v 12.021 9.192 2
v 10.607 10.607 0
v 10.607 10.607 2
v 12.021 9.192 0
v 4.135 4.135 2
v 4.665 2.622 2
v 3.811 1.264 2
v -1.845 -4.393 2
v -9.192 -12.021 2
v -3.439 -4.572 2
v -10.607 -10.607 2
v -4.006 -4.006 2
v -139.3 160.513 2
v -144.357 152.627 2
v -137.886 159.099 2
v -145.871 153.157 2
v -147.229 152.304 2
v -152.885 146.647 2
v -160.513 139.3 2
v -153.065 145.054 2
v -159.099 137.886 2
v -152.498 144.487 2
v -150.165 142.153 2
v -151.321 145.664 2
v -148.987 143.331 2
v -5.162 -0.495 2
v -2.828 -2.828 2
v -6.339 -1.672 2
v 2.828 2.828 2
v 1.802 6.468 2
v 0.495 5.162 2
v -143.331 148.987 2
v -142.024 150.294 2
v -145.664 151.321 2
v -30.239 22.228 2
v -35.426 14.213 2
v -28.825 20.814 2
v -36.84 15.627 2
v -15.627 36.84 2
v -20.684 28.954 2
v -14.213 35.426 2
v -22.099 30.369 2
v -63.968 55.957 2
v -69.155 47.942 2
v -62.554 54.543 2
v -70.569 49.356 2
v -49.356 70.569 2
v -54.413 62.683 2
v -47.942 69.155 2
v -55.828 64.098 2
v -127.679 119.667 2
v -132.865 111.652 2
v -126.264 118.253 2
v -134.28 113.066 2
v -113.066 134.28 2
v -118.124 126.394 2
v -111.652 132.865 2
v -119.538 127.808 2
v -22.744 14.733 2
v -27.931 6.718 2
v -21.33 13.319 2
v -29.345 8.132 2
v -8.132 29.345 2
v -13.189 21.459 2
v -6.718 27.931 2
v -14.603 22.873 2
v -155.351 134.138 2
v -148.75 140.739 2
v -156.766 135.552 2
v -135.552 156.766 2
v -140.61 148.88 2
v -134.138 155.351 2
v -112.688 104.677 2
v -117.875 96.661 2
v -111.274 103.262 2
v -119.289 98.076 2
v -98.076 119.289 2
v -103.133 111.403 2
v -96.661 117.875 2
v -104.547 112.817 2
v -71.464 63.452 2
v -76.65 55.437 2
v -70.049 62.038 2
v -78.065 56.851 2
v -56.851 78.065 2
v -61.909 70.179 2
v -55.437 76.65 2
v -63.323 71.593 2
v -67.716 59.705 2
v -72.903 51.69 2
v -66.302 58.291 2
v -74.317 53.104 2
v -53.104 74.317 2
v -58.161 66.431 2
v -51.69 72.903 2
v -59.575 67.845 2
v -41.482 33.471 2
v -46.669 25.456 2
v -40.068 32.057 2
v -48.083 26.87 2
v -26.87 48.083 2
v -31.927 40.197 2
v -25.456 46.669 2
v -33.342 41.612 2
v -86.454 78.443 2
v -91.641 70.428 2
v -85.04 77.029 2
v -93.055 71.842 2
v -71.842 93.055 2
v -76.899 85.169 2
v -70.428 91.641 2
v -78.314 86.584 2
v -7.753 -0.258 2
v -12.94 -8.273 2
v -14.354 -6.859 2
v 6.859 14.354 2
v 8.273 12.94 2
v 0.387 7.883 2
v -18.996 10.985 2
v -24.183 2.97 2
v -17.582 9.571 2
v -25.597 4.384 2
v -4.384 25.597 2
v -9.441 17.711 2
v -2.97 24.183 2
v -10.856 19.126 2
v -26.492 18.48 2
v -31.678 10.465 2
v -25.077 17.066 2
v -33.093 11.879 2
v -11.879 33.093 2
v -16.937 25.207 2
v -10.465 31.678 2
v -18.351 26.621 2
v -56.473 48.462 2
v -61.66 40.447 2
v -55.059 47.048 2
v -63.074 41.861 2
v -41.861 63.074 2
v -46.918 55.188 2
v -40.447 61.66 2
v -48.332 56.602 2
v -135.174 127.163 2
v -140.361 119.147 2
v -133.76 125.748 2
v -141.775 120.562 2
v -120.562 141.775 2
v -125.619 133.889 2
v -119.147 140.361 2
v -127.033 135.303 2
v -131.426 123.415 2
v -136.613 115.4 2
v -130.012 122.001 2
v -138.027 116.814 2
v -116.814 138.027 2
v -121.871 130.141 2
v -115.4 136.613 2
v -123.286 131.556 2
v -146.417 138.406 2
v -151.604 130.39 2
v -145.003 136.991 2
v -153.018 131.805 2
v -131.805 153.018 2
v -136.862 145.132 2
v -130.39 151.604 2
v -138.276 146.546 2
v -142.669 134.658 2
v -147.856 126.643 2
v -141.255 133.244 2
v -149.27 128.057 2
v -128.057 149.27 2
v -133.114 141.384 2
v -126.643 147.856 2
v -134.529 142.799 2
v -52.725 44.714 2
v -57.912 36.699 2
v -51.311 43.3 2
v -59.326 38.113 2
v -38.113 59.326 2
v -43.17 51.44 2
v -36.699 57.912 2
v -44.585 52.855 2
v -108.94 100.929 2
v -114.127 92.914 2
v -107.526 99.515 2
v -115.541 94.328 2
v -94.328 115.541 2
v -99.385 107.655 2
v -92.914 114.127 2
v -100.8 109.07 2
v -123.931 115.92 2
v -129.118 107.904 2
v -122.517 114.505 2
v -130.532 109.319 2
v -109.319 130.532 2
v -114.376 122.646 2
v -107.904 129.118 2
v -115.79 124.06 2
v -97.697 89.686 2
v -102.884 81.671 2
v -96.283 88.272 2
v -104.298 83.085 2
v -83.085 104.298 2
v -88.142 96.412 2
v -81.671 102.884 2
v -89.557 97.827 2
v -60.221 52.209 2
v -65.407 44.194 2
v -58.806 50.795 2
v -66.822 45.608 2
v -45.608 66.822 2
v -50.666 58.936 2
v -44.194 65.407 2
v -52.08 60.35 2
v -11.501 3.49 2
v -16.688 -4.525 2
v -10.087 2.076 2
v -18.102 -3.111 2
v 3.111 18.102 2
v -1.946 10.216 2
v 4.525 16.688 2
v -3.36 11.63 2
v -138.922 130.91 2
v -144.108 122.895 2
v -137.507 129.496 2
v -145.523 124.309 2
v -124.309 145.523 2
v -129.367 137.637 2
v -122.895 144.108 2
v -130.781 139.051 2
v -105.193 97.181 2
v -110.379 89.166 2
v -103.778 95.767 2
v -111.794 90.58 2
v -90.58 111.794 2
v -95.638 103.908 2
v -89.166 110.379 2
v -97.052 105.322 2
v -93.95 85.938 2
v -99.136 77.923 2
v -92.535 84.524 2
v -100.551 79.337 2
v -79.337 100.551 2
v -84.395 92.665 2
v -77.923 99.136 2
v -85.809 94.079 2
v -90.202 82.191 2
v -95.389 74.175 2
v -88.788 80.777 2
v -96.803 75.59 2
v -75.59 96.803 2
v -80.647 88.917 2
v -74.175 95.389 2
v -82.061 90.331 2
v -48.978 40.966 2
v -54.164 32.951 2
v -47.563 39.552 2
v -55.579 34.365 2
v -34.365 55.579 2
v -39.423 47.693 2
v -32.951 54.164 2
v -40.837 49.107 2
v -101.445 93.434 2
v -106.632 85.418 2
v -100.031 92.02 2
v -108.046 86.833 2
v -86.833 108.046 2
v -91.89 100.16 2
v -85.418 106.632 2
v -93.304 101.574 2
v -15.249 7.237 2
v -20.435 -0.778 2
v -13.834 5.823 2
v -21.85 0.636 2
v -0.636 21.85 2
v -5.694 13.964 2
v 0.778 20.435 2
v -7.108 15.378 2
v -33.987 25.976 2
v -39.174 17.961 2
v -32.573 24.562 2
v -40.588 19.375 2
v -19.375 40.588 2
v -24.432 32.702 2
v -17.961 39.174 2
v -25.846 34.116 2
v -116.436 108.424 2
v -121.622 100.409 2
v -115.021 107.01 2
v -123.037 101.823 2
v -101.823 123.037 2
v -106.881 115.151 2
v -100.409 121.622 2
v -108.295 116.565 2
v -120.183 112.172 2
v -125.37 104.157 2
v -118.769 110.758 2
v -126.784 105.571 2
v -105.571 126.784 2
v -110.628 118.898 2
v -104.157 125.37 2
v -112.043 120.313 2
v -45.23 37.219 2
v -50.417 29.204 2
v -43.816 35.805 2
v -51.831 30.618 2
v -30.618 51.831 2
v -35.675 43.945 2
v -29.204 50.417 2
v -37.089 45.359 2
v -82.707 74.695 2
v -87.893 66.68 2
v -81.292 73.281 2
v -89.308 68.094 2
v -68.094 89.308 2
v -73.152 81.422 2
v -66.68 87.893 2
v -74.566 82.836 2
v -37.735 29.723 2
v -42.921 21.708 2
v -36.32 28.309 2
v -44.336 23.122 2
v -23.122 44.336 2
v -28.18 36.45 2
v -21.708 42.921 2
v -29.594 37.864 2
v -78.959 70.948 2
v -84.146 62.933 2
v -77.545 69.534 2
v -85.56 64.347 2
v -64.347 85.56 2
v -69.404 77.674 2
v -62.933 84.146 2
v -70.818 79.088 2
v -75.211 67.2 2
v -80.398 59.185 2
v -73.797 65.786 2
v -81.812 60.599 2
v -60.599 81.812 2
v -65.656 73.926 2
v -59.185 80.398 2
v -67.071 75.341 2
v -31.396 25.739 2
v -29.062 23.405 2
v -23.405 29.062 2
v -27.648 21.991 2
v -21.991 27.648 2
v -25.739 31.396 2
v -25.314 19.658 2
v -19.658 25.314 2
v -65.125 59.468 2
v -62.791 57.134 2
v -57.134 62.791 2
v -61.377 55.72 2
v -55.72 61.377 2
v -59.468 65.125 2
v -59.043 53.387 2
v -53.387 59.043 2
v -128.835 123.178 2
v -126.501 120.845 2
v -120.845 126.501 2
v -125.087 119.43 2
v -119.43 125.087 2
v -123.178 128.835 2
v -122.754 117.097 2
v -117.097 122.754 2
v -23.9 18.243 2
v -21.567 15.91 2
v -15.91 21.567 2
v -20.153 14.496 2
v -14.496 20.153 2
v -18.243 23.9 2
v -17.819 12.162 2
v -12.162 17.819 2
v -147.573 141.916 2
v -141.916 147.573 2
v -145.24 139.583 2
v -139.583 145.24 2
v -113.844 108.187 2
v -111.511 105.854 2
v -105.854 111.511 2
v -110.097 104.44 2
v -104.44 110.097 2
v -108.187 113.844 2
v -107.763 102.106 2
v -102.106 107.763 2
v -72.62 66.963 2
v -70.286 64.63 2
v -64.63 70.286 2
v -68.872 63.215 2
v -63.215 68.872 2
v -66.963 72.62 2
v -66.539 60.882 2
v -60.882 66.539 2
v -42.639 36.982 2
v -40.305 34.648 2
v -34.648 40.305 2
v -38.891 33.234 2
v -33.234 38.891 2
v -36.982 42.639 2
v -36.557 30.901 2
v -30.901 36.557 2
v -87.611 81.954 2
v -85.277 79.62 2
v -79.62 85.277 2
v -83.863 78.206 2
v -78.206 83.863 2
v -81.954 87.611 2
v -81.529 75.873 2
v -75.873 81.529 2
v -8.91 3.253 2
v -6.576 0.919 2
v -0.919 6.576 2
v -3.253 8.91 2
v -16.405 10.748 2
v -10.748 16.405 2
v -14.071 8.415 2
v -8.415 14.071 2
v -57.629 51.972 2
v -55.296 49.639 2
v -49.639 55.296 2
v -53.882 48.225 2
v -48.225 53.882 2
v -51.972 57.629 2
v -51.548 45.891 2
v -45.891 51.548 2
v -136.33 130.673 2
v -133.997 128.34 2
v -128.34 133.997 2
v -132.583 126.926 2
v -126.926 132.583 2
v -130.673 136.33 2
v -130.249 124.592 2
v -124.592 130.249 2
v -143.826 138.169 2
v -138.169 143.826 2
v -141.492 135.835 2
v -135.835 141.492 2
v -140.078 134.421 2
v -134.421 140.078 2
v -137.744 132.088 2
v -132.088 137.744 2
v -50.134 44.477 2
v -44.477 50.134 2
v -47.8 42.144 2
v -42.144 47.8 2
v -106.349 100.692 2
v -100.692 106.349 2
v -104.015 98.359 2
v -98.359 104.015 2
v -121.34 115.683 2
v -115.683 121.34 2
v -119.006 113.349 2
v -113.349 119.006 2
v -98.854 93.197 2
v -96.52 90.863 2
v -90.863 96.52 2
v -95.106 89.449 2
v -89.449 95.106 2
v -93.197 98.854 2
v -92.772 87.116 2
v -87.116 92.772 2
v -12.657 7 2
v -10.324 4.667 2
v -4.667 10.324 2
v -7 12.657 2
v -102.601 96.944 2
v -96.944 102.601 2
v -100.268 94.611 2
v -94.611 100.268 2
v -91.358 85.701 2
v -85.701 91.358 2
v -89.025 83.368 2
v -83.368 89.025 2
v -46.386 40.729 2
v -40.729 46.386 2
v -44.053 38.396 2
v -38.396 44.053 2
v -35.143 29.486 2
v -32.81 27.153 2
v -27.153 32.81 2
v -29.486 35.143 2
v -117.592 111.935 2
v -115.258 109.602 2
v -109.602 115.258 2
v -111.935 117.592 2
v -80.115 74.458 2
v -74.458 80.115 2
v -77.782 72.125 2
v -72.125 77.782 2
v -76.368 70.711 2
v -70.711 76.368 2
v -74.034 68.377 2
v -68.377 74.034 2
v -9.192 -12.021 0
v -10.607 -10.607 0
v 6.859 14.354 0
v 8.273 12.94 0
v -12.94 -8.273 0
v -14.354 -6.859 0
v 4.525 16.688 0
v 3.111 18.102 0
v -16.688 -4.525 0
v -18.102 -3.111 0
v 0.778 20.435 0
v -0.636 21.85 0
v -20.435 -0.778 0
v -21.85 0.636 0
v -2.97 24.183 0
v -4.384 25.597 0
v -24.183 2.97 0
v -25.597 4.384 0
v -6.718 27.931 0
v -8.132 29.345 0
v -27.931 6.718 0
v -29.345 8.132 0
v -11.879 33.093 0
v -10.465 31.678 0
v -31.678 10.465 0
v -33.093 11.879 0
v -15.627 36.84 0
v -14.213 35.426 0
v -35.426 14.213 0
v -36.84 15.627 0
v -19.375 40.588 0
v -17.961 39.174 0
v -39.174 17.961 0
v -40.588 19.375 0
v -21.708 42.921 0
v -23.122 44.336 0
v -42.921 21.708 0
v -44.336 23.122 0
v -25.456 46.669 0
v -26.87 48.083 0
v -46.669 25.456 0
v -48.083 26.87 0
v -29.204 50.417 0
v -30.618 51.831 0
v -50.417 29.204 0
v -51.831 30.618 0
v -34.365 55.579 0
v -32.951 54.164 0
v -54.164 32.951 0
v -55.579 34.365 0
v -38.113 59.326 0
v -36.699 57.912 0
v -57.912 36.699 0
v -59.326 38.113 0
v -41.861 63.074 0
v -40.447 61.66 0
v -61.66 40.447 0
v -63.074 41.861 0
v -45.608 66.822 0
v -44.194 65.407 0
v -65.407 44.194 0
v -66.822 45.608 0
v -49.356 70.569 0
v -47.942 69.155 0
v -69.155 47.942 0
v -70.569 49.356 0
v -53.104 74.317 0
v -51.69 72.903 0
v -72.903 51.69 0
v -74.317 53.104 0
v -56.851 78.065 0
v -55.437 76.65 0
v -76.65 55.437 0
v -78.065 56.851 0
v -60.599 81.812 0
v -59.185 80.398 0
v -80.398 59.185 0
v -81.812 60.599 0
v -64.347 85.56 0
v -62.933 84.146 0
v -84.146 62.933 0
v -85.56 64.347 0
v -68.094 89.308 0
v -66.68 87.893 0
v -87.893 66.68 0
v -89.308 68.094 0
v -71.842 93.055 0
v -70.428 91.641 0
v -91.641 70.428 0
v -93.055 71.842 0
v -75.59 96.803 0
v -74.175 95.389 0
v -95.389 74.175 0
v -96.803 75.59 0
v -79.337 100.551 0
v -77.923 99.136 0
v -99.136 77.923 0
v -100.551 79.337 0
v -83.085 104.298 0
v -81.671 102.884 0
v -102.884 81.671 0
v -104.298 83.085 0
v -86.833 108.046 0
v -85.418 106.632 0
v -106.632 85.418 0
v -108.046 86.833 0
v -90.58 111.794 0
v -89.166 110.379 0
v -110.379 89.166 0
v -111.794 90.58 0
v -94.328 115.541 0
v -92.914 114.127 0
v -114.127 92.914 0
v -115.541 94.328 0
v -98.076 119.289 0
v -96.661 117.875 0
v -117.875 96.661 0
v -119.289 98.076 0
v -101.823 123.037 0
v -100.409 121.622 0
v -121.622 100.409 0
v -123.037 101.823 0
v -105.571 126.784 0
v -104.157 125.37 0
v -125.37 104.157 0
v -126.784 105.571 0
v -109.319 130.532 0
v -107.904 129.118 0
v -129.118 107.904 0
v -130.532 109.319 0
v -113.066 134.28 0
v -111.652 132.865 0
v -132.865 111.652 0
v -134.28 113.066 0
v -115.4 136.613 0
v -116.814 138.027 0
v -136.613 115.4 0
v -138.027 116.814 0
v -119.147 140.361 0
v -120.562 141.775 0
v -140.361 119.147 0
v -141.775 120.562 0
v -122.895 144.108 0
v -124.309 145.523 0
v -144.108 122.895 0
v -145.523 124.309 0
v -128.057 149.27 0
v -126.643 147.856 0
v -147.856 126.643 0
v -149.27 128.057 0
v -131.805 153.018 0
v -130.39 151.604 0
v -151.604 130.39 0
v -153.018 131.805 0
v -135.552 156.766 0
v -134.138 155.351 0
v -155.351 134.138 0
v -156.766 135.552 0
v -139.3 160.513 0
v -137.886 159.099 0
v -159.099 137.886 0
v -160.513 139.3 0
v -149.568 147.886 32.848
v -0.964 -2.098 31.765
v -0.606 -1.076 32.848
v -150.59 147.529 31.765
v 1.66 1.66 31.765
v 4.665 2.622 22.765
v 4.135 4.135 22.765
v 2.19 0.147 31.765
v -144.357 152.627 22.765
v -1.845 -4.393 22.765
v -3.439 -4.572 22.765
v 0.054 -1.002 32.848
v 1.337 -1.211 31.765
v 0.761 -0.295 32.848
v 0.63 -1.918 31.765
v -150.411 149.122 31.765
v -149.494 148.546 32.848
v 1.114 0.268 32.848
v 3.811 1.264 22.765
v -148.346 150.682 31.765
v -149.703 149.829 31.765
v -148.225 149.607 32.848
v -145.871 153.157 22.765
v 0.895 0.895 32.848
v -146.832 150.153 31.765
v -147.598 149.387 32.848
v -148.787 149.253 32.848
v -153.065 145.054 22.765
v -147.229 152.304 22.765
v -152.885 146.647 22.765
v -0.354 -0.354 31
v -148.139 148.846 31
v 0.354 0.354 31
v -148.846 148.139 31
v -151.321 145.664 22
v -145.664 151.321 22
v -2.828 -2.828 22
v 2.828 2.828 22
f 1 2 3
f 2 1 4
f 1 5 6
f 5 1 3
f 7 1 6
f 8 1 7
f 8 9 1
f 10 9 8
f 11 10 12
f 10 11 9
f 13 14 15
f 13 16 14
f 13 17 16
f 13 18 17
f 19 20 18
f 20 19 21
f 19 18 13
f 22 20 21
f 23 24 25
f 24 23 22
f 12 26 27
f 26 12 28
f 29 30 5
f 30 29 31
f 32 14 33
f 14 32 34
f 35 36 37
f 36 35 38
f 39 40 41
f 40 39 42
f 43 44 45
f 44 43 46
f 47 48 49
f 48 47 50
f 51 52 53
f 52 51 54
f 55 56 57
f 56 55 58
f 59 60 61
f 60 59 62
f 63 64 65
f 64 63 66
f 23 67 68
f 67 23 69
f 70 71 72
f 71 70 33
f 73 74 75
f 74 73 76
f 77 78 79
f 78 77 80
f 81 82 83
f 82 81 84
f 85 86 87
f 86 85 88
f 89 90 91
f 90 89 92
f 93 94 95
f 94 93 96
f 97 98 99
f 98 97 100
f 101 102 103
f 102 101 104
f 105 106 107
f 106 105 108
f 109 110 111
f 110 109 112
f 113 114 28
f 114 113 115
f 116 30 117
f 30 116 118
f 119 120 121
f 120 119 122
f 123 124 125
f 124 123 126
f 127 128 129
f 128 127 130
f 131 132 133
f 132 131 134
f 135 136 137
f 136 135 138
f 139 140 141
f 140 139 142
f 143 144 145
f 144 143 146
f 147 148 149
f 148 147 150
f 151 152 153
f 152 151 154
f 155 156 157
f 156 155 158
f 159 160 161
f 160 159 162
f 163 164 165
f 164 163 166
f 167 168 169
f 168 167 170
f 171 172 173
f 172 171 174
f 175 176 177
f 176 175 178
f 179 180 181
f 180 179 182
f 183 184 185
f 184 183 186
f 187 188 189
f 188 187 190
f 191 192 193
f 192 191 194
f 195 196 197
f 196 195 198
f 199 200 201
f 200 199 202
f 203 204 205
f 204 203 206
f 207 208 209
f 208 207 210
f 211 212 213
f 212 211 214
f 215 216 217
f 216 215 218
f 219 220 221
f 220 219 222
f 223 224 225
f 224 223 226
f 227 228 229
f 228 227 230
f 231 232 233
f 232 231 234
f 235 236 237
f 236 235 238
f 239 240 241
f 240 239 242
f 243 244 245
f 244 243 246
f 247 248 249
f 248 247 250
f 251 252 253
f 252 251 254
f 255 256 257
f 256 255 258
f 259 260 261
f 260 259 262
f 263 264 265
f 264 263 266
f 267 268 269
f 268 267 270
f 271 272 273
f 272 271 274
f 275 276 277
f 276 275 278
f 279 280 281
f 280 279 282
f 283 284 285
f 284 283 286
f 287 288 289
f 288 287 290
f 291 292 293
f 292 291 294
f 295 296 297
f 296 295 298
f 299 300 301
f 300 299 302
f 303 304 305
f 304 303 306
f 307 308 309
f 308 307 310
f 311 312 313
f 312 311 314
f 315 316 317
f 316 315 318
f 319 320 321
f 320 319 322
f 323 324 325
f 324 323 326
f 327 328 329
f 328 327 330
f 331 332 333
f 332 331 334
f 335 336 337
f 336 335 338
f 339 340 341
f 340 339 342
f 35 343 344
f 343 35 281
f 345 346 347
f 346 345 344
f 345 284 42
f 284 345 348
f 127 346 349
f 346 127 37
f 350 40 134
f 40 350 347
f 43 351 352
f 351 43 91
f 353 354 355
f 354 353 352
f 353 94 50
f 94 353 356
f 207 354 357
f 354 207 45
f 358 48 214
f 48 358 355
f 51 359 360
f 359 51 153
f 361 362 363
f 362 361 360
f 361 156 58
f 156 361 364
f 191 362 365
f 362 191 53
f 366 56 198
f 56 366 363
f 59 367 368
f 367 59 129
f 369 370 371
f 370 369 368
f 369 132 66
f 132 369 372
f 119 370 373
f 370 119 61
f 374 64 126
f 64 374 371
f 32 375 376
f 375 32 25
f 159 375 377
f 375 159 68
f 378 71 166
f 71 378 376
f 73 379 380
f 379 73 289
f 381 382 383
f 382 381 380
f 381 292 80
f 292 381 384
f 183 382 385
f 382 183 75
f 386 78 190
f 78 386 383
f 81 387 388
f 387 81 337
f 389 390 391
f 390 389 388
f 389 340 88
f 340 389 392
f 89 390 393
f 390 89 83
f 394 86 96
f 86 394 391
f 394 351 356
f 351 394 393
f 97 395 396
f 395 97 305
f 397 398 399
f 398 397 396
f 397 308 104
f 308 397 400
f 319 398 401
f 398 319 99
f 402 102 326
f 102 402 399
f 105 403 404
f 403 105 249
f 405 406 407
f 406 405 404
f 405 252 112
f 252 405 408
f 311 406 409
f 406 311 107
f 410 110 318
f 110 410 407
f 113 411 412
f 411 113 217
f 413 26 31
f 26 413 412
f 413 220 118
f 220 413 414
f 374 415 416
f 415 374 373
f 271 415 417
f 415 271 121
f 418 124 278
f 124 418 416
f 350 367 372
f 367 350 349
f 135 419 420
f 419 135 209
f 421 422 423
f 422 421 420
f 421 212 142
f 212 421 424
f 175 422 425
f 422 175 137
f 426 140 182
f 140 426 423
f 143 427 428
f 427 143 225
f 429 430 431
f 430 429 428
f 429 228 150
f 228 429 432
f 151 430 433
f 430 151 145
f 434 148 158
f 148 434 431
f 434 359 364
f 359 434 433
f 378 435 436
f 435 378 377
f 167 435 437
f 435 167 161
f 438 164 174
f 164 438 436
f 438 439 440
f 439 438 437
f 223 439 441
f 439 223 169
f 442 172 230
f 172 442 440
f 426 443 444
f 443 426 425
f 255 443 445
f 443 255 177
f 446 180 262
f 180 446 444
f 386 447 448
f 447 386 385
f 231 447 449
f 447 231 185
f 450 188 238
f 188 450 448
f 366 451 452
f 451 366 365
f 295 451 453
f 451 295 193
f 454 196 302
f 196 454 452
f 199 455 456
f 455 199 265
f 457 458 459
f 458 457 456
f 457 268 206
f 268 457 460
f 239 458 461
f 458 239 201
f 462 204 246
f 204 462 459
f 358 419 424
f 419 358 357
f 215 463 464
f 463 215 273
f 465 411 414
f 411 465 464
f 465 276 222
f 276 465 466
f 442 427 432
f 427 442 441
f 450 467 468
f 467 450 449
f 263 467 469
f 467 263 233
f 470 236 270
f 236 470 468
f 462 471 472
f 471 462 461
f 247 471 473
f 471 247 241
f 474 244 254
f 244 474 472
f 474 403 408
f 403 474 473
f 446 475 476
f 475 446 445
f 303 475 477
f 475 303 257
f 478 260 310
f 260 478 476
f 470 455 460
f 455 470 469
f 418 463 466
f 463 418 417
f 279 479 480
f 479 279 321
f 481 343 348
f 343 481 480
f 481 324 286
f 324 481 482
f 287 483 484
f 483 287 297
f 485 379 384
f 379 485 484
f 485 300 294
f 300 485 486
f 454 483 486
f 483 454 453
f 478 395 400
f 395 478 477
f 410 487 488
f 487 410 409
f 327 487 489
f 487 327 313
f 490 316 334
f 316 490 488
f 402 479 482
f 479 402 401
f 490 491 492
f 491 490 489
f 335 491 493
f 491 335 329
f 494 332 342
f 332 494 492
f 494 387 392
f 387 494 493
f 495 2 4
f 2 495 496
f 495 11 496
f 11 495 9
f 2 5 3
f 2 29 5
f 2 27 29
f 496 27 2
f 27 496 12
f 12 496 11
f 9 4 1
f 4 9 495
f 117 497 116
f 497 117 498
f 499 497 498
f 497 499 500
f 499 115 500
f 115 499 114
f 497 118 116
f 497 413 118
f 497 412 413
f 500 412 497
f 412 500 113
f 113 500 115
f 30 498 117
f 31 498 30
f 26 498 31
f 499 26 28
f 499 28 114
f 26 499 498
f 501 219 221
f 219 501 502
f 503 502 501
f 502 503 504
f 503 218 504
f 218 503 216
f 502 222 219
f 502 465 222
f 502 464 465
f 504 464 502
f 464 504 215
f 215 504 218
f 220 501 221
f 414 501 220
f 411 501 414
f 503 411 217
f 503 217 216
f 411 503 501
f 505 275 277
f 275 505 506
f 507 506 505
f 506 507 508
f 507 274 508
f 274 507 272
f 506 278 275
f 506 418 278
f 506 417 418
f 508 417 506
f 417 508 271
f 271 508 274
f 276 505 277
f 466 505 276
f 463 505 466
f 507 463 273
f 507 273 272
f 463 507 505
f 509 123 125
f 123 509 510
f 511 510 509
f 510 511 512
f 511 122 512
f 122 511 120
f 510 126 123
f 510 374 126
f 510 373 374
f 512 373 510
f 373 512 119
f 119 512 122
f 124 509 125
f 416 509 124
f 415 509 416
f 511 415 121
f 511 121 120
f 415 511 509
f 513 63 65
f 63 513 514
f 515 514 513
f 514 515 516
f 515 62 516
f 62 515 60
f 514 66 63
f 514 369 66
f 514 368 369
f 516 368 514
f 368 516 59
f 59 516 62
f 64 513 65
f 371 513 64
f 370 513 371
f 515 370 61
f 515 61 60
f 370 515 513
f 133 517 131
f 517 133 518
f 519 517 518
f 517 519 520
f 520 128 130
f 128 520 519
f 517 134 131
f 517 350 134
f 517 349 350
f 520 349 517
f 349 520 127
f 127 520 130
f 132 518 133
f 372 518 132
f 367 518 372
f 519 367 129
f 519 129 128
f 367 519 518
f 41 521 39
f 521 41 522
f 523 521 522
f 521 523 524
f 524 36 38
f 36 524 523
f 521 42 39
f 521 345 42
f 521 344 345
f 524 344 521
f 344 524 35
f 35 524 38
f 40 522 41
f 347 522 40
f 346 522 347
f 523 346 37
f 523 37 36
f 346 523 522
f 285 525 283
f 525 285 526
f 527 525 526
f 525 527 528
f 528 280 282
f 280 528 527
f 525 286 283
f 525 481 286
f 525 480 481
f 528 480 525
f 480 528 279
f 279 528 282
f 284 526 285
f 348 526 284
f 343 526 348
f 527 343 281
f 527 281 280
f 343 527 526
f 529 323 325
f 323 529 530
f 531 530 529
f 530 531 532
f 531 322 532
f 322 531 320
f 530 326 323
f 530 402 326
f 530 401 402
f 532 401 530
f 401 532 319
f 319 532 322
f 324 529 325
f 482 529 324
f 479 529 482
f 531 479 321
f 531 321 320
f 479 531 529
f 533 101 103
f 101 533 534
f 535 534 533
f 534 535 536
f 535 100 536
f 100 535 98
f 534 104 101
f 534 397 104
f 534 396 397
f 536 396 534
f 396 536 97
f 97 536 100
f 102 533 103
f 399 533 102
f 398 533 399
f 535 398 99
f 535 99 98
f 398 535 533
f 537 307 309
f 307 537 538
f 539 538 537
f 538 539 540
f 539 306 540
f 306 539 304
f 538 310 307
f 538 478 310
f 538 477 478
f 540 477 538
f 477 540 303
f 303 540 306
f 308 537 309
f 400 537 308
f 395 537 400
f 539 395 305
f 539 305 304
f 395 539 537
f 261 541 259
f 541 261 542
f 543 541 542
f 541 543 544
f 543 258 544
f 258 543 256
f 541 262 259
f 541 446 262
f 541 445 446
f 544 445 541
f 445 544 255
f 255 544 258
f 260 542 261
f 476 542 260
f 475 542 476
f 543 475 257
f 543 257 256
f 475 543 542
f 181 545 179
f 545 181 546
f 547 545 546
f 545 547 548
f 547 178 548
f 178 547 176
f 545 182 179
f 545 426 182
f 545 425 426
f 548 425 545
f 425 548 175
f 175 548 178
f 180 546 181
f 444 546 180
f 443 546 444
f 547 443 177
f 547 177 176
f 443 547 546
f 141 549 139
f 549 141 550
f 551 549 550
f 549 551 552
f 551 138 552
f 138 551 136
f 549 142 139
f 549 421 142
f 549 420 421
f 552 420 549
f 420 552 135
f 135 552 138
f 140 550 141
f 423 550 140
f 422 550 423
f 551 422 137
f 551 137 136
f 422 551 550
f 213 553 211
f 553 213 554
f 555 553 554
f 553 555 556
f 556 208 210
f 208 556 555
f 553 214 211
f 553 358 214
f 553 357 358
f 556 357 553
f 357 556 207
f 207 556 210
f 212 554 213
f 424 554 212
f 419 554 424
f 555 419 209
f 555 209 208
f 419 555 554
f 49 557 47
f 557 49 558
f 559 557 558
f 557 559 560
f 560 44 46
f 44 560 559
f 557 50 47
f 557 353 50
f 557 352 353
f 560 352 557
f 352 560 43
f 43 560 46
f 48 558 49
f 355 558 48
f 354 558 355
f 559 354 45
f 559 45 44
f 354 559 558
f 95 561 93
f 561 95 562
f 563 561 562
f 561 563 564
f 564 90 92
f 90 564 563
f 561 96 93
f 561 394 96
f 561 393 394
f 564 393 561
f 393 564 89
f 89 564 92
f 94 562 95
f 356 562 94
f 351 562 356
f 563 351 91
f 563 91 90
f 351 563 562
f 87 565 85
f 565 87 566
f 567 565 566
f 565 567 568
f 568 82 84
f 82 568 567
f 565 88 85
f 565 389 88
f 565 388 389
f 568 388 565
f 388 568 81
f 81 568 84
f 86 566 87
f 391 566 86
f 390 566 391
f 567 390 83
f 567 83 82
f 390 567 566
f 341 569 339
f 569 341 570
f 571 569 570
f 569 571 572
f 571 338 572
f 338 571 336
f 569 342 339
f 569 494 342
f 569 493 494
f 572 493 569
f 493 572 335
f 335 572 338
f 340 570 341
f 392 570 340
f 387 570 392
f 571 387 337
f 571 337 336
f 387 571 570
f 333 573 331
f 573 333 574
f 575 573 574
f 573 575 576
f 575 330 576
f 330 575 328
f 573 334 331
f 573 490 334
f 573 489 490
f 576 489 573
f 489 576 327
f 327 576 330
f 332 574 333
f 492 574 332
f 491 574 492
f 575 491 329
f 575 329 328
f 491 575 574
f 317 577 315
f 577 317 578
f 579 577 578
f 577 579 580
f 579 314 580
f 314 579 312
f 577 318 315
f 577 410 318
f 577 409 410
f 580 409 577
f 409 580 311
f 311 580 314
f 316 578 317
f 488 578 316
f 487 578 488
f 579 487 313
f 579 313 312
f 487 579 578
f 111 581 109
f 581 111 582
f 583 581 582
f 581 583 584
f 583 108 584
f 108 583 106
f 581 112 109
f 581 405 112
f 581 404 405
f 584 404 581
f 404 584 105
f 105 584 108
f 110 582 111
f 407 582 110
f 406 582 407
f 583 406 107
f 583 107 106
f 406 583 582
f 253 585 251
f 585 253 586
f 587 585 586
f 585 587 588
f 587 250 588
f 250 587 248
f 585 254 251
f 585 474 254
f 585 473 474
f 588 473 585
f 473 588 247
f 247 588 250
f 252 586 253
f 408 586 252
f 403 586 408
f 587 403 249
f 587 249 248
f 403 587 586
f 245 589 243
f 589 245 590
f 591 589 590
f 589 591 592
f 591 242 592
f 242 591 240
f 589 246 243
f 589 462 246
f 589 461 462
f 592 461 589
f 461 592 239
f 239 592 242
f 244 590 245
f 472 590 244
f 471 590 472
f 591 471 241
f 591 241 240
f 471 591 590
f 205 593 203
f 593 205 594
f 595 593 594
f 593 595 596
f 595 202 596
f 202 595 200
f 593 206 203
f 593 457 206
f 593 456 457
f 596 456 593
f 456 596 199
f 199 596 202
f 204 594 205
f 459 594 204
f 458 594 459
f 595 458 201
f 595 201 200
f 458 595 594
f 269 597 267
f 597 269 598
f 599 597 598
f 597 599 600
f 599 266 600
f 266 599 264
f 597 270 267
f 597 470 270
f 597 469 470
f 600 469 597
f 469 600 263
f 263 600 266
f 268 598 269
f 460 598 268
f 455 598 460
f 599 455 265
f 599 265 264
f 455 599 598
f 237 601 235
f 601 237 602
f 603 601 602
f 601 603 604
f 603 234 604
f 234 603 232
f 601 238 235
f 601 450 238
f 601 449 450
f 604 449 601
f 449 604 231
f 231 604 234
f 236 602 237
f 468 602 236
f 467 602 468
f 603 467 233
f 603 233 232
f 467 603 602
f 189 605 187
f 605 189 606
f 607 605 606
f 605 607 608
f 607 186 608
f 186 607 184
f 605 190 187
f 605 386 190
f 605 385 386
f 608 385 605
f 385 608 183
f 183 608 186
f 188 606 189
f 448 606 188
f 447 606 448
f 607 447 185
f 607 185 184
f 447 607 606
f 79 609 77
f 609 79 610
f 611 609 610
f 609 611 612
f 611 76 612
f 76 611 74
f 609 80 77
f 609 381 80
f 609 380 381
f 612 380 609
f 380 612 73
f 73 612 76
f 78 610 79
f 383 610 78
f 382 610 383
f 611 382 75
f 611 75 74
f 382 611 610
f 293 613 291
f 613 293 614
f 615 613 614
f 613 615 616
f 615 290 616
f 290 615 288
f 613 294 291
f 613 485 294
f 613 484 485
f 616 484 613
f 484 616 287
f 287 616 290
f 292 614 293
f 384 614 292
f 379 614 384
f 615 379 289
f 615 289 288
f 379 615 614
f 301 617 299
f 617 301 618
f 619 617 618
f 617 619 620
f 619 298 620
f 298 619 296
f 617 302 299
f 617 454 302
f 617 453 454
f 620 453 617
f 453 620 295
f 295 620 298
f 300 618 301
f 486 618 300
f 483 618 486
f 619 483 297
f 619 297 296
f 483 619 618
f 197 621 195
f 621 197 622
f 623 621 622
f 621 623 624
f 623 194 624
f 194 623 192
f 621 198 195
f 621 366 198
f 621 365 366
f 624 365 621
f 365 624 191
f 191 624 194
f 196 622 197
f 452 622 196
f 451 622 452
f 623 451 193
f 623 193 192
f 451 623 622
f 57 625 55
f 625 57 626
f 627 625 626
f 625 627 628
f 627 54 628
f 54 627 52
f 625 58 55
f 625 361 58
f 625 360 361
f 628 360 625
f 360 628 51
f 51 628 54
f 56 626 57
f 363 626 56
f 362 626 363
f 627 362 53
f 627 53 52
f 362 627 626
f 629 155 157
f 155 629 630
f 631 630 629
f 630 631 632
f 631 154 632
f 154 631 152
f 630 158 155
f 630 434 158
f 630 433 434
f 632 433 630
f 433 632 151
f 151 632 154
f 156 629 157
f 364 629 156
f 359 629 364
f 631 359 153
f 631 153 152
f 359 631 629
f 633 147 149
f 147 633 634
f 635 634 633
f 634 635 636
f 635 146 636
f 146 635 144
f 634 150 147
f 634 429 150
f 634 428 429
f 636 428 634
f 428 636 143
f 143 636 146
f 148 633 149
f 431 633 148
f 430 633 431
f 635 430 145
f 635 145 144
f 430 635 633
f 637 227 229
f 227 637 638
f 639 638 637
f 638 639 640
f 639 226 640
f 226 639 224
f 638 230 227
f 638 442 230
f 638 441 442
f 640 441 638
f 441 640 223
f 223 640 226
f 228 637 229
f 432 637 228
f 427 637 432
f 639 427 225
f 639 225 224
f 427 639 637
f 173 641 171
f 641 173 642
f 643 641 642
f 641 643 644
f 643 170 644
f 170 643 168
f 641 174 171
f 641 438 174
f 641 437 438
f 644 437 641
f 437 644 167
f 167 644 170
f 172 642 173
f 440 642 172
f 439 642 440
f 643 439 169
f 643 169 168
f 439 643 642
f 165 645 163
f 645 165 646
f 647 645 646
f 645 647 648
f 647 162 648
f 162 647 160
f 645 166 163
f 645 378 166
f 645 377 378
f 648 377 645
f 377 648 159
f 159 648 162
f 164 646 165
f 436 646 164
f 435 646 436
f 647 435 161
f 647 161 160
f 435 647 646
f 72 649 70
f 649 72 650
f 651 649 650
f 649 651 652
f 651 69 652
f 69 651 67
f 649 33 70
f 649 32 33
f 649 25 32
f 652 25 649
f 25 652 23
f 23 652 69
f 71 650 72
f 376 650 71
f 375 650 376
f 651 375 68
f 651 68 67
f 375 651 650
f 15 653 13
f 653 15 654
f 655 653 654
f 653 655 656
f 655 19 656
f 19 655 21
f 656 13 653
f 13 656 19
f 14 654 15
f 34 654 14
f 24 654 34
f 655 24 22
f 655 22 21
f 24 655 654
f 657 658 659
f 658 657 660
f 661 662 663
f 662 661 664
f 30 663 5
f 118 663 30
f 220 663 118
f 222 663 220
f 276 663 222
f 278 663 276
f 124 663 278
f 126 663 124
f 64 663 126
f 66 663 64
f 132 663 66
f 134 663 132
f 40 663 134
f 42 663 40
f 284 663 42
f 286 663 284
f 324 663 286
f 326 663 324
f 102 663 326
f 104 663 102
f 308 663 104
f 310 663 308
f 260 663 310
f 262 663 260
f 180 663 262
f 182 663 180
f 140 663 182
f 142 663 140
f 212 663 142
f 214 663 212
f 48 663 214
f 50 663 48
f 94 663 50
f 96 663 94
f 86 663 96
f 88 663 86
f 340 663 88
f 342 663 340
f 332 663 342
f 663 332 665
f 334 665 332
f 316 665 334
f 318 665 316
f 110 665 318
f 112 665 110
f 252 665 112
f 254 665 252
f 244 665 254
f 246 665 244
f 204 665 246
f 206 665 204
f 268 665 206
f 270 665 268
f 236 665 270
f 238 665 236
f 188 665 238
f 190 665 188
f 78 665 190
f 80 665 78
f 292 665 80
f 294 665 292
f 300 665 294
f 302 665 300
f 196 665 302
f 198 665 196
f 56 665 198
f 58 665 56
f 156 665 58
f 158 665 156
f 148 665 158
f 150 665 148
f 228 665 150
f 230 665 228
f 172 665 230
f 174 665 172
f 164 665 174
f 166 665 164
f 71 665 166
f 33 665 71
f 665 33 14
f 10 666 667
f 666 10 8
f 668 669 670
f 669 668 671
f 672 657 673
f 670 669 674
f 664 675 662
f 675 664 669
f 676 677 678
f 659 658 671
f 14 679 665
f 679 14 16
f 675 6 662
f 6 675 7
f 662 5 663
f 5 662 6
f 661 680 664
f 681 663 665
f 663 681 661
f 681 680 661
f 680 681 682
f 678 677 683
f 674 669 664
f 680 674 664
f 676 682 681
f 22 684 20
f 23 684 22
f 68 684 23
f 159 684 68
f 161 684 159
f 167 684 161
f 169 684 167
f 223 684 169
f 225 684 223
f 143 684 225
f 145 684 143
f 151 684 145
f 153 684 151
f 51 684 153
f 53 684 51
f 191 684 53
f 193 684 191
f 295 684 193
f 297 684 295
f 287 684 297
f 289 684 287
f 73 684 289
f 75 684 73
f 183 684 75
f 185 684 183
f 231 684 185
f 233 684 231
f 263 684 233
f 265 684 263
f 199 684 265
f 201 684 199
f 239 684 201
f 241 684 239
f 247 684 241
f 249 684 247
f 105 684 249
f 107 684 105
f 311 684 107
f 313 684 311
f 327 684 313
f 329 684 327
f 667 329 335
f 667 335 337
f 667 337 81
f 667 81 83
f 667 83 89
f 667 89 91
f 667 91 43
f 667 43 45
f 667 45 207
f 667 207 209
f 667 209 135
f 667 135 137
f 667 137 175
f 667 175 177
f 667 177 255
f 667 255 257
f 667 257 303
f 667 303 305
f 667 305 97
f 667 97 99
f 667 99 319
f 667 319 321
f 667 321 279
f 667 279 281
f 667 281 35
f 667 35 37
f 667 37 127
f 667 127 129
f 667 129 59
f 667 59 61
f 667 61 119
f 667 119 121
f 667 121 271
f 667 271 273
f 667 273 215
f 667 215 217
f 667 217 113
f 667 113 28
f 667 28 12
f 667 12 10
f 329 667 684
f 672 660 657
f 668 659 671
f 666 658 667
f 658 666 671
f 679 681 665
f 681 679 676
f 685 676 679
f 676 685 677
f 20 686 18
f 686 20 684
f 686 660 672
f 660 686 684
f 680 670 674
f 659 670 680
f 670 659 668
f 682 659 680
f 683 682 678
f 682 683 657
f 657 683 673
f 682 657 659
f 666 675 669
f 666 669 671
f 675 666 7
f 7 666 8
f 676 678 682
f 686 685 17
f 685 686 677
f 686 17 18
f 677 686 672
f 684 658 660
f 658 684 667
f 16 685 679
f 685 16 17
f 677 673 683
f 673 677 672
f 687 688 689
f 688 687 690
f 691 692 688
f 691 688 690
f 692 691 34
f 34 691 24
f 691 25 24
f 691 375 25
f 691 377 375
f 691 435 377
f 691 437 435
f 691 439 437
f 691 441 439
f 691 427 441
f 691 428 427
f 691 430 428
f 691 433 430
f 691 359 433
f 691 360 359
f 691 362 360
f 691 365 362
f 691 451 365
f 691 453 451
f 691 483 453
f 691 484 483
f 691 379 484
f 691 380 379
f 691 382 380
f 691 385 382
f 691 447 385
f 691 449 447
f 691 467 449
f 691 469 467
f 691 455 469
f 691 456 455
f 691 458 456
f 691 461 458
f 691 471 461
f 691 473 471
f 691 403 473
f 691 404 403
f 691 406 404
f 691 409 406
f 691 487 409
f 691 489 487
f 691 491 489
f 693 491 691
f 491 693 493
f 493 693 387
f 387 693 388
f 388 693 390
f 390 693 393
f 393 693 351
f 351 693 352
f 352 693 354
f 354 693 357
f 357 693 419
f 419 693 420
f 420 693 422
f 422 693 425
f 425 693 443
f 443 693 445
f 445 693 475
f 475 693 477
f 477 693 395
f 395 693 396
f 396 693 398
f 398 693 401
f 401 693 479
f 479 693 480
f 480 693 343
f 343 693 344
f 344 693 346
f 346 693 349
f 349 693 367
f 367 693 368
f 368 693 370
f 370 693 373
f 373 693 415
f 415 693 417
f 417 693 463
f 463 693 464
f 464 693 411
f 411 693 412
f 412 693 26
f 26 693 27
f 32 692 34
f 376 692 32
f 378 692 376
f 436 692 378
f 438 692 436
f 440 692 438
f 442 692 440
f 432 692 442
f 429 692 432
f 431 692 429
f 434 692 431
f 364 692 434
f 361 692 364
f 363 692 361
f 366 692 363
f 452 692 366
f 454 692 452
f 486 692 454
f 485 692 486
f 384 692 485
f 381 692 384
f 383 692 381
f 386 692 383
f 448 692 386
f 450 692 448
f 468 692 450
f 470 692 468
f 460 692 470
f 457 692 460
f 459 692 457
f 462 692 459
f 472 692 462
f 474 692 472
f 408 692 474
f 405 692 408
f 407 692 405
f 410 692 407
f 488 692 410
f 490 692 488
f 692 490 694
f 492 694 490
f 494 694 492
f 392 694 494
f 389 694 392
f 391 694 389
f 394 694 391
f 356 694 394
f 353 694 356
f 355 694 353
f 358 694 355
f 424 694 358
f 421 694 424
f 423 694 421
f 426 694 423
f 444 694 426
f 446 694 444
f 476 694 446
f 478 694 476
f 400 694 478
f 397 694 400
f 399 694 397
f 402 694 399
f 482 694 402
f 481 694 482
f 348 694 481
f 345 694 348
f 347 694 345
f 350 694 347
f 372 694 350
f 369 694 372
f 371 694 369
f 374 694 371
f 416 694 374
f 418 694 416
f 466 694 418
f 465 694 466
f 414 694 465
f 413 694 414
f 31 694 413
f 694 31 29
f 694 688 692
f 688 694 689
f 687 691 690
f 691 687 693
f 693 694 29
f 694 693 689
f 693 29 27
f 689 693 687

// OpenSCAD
/*
	3D printable small hive beetle trap
	Copyright (C) 2017 Travis John Howse

	This program is free software: you can redistribute it and/or modify
	it under the terms of the GNU General Public License as published by
	the Free Software Foundation, either version 3 of the License, or
	(at your option) any later version.

	This program is distributed in the hope that it will be useful,
	but WITHOUT ANY WARRANTY; without even the implied warranty of
	MERCHANTABILITY or FITNESS FOR A PARTICULAR PURPOSE.  See the
	GNU General Public License for more details.

	You should have received a copy of the GNU General Public License
	along with this program.  If not, see <http://www.gnu.org/licenses/>.
*/

// Gap for beetles
gap = 3.3; // [2:0.1:5]
// Wall thickness
wt = 2; // [1:3]
// How many blades. Controls the length.
blades = 40; //[5:100]
// Blade width
blade_x = 30; // [10:50]
// Oil trap width
box_x = 12; // [5:25]
// Oil trap depth
box_z = 30; // [10:60]

total_y = blades*(gap+wt)+wt;

rotate([0,0,45]) {
translate([0,-wt,0]) for (i=[0:blades]) {
	translate([-blade_x/2,i*(wt+gap),0]) cube([blade_x,wt,wt]);
}

translate([-(box_x-wt*2)/2,0,0]) box();
}

module box() {
	difference() {
		minkowski() {
			inner_box();
			sphere(r=wt);
		}
		inner_box();
		cube([1000,1000,wt*2],center=true);
	}
}

module inner_box() {
	hull() {
		cube([box_x-wt*2,total_y-wt*2,box_z-(box_x-2*wt)]);
		translate([(box_x-wt*2)/2-wt/4,0,box_z]) cube([1,total_y-wt*2,1]);
	}
}
